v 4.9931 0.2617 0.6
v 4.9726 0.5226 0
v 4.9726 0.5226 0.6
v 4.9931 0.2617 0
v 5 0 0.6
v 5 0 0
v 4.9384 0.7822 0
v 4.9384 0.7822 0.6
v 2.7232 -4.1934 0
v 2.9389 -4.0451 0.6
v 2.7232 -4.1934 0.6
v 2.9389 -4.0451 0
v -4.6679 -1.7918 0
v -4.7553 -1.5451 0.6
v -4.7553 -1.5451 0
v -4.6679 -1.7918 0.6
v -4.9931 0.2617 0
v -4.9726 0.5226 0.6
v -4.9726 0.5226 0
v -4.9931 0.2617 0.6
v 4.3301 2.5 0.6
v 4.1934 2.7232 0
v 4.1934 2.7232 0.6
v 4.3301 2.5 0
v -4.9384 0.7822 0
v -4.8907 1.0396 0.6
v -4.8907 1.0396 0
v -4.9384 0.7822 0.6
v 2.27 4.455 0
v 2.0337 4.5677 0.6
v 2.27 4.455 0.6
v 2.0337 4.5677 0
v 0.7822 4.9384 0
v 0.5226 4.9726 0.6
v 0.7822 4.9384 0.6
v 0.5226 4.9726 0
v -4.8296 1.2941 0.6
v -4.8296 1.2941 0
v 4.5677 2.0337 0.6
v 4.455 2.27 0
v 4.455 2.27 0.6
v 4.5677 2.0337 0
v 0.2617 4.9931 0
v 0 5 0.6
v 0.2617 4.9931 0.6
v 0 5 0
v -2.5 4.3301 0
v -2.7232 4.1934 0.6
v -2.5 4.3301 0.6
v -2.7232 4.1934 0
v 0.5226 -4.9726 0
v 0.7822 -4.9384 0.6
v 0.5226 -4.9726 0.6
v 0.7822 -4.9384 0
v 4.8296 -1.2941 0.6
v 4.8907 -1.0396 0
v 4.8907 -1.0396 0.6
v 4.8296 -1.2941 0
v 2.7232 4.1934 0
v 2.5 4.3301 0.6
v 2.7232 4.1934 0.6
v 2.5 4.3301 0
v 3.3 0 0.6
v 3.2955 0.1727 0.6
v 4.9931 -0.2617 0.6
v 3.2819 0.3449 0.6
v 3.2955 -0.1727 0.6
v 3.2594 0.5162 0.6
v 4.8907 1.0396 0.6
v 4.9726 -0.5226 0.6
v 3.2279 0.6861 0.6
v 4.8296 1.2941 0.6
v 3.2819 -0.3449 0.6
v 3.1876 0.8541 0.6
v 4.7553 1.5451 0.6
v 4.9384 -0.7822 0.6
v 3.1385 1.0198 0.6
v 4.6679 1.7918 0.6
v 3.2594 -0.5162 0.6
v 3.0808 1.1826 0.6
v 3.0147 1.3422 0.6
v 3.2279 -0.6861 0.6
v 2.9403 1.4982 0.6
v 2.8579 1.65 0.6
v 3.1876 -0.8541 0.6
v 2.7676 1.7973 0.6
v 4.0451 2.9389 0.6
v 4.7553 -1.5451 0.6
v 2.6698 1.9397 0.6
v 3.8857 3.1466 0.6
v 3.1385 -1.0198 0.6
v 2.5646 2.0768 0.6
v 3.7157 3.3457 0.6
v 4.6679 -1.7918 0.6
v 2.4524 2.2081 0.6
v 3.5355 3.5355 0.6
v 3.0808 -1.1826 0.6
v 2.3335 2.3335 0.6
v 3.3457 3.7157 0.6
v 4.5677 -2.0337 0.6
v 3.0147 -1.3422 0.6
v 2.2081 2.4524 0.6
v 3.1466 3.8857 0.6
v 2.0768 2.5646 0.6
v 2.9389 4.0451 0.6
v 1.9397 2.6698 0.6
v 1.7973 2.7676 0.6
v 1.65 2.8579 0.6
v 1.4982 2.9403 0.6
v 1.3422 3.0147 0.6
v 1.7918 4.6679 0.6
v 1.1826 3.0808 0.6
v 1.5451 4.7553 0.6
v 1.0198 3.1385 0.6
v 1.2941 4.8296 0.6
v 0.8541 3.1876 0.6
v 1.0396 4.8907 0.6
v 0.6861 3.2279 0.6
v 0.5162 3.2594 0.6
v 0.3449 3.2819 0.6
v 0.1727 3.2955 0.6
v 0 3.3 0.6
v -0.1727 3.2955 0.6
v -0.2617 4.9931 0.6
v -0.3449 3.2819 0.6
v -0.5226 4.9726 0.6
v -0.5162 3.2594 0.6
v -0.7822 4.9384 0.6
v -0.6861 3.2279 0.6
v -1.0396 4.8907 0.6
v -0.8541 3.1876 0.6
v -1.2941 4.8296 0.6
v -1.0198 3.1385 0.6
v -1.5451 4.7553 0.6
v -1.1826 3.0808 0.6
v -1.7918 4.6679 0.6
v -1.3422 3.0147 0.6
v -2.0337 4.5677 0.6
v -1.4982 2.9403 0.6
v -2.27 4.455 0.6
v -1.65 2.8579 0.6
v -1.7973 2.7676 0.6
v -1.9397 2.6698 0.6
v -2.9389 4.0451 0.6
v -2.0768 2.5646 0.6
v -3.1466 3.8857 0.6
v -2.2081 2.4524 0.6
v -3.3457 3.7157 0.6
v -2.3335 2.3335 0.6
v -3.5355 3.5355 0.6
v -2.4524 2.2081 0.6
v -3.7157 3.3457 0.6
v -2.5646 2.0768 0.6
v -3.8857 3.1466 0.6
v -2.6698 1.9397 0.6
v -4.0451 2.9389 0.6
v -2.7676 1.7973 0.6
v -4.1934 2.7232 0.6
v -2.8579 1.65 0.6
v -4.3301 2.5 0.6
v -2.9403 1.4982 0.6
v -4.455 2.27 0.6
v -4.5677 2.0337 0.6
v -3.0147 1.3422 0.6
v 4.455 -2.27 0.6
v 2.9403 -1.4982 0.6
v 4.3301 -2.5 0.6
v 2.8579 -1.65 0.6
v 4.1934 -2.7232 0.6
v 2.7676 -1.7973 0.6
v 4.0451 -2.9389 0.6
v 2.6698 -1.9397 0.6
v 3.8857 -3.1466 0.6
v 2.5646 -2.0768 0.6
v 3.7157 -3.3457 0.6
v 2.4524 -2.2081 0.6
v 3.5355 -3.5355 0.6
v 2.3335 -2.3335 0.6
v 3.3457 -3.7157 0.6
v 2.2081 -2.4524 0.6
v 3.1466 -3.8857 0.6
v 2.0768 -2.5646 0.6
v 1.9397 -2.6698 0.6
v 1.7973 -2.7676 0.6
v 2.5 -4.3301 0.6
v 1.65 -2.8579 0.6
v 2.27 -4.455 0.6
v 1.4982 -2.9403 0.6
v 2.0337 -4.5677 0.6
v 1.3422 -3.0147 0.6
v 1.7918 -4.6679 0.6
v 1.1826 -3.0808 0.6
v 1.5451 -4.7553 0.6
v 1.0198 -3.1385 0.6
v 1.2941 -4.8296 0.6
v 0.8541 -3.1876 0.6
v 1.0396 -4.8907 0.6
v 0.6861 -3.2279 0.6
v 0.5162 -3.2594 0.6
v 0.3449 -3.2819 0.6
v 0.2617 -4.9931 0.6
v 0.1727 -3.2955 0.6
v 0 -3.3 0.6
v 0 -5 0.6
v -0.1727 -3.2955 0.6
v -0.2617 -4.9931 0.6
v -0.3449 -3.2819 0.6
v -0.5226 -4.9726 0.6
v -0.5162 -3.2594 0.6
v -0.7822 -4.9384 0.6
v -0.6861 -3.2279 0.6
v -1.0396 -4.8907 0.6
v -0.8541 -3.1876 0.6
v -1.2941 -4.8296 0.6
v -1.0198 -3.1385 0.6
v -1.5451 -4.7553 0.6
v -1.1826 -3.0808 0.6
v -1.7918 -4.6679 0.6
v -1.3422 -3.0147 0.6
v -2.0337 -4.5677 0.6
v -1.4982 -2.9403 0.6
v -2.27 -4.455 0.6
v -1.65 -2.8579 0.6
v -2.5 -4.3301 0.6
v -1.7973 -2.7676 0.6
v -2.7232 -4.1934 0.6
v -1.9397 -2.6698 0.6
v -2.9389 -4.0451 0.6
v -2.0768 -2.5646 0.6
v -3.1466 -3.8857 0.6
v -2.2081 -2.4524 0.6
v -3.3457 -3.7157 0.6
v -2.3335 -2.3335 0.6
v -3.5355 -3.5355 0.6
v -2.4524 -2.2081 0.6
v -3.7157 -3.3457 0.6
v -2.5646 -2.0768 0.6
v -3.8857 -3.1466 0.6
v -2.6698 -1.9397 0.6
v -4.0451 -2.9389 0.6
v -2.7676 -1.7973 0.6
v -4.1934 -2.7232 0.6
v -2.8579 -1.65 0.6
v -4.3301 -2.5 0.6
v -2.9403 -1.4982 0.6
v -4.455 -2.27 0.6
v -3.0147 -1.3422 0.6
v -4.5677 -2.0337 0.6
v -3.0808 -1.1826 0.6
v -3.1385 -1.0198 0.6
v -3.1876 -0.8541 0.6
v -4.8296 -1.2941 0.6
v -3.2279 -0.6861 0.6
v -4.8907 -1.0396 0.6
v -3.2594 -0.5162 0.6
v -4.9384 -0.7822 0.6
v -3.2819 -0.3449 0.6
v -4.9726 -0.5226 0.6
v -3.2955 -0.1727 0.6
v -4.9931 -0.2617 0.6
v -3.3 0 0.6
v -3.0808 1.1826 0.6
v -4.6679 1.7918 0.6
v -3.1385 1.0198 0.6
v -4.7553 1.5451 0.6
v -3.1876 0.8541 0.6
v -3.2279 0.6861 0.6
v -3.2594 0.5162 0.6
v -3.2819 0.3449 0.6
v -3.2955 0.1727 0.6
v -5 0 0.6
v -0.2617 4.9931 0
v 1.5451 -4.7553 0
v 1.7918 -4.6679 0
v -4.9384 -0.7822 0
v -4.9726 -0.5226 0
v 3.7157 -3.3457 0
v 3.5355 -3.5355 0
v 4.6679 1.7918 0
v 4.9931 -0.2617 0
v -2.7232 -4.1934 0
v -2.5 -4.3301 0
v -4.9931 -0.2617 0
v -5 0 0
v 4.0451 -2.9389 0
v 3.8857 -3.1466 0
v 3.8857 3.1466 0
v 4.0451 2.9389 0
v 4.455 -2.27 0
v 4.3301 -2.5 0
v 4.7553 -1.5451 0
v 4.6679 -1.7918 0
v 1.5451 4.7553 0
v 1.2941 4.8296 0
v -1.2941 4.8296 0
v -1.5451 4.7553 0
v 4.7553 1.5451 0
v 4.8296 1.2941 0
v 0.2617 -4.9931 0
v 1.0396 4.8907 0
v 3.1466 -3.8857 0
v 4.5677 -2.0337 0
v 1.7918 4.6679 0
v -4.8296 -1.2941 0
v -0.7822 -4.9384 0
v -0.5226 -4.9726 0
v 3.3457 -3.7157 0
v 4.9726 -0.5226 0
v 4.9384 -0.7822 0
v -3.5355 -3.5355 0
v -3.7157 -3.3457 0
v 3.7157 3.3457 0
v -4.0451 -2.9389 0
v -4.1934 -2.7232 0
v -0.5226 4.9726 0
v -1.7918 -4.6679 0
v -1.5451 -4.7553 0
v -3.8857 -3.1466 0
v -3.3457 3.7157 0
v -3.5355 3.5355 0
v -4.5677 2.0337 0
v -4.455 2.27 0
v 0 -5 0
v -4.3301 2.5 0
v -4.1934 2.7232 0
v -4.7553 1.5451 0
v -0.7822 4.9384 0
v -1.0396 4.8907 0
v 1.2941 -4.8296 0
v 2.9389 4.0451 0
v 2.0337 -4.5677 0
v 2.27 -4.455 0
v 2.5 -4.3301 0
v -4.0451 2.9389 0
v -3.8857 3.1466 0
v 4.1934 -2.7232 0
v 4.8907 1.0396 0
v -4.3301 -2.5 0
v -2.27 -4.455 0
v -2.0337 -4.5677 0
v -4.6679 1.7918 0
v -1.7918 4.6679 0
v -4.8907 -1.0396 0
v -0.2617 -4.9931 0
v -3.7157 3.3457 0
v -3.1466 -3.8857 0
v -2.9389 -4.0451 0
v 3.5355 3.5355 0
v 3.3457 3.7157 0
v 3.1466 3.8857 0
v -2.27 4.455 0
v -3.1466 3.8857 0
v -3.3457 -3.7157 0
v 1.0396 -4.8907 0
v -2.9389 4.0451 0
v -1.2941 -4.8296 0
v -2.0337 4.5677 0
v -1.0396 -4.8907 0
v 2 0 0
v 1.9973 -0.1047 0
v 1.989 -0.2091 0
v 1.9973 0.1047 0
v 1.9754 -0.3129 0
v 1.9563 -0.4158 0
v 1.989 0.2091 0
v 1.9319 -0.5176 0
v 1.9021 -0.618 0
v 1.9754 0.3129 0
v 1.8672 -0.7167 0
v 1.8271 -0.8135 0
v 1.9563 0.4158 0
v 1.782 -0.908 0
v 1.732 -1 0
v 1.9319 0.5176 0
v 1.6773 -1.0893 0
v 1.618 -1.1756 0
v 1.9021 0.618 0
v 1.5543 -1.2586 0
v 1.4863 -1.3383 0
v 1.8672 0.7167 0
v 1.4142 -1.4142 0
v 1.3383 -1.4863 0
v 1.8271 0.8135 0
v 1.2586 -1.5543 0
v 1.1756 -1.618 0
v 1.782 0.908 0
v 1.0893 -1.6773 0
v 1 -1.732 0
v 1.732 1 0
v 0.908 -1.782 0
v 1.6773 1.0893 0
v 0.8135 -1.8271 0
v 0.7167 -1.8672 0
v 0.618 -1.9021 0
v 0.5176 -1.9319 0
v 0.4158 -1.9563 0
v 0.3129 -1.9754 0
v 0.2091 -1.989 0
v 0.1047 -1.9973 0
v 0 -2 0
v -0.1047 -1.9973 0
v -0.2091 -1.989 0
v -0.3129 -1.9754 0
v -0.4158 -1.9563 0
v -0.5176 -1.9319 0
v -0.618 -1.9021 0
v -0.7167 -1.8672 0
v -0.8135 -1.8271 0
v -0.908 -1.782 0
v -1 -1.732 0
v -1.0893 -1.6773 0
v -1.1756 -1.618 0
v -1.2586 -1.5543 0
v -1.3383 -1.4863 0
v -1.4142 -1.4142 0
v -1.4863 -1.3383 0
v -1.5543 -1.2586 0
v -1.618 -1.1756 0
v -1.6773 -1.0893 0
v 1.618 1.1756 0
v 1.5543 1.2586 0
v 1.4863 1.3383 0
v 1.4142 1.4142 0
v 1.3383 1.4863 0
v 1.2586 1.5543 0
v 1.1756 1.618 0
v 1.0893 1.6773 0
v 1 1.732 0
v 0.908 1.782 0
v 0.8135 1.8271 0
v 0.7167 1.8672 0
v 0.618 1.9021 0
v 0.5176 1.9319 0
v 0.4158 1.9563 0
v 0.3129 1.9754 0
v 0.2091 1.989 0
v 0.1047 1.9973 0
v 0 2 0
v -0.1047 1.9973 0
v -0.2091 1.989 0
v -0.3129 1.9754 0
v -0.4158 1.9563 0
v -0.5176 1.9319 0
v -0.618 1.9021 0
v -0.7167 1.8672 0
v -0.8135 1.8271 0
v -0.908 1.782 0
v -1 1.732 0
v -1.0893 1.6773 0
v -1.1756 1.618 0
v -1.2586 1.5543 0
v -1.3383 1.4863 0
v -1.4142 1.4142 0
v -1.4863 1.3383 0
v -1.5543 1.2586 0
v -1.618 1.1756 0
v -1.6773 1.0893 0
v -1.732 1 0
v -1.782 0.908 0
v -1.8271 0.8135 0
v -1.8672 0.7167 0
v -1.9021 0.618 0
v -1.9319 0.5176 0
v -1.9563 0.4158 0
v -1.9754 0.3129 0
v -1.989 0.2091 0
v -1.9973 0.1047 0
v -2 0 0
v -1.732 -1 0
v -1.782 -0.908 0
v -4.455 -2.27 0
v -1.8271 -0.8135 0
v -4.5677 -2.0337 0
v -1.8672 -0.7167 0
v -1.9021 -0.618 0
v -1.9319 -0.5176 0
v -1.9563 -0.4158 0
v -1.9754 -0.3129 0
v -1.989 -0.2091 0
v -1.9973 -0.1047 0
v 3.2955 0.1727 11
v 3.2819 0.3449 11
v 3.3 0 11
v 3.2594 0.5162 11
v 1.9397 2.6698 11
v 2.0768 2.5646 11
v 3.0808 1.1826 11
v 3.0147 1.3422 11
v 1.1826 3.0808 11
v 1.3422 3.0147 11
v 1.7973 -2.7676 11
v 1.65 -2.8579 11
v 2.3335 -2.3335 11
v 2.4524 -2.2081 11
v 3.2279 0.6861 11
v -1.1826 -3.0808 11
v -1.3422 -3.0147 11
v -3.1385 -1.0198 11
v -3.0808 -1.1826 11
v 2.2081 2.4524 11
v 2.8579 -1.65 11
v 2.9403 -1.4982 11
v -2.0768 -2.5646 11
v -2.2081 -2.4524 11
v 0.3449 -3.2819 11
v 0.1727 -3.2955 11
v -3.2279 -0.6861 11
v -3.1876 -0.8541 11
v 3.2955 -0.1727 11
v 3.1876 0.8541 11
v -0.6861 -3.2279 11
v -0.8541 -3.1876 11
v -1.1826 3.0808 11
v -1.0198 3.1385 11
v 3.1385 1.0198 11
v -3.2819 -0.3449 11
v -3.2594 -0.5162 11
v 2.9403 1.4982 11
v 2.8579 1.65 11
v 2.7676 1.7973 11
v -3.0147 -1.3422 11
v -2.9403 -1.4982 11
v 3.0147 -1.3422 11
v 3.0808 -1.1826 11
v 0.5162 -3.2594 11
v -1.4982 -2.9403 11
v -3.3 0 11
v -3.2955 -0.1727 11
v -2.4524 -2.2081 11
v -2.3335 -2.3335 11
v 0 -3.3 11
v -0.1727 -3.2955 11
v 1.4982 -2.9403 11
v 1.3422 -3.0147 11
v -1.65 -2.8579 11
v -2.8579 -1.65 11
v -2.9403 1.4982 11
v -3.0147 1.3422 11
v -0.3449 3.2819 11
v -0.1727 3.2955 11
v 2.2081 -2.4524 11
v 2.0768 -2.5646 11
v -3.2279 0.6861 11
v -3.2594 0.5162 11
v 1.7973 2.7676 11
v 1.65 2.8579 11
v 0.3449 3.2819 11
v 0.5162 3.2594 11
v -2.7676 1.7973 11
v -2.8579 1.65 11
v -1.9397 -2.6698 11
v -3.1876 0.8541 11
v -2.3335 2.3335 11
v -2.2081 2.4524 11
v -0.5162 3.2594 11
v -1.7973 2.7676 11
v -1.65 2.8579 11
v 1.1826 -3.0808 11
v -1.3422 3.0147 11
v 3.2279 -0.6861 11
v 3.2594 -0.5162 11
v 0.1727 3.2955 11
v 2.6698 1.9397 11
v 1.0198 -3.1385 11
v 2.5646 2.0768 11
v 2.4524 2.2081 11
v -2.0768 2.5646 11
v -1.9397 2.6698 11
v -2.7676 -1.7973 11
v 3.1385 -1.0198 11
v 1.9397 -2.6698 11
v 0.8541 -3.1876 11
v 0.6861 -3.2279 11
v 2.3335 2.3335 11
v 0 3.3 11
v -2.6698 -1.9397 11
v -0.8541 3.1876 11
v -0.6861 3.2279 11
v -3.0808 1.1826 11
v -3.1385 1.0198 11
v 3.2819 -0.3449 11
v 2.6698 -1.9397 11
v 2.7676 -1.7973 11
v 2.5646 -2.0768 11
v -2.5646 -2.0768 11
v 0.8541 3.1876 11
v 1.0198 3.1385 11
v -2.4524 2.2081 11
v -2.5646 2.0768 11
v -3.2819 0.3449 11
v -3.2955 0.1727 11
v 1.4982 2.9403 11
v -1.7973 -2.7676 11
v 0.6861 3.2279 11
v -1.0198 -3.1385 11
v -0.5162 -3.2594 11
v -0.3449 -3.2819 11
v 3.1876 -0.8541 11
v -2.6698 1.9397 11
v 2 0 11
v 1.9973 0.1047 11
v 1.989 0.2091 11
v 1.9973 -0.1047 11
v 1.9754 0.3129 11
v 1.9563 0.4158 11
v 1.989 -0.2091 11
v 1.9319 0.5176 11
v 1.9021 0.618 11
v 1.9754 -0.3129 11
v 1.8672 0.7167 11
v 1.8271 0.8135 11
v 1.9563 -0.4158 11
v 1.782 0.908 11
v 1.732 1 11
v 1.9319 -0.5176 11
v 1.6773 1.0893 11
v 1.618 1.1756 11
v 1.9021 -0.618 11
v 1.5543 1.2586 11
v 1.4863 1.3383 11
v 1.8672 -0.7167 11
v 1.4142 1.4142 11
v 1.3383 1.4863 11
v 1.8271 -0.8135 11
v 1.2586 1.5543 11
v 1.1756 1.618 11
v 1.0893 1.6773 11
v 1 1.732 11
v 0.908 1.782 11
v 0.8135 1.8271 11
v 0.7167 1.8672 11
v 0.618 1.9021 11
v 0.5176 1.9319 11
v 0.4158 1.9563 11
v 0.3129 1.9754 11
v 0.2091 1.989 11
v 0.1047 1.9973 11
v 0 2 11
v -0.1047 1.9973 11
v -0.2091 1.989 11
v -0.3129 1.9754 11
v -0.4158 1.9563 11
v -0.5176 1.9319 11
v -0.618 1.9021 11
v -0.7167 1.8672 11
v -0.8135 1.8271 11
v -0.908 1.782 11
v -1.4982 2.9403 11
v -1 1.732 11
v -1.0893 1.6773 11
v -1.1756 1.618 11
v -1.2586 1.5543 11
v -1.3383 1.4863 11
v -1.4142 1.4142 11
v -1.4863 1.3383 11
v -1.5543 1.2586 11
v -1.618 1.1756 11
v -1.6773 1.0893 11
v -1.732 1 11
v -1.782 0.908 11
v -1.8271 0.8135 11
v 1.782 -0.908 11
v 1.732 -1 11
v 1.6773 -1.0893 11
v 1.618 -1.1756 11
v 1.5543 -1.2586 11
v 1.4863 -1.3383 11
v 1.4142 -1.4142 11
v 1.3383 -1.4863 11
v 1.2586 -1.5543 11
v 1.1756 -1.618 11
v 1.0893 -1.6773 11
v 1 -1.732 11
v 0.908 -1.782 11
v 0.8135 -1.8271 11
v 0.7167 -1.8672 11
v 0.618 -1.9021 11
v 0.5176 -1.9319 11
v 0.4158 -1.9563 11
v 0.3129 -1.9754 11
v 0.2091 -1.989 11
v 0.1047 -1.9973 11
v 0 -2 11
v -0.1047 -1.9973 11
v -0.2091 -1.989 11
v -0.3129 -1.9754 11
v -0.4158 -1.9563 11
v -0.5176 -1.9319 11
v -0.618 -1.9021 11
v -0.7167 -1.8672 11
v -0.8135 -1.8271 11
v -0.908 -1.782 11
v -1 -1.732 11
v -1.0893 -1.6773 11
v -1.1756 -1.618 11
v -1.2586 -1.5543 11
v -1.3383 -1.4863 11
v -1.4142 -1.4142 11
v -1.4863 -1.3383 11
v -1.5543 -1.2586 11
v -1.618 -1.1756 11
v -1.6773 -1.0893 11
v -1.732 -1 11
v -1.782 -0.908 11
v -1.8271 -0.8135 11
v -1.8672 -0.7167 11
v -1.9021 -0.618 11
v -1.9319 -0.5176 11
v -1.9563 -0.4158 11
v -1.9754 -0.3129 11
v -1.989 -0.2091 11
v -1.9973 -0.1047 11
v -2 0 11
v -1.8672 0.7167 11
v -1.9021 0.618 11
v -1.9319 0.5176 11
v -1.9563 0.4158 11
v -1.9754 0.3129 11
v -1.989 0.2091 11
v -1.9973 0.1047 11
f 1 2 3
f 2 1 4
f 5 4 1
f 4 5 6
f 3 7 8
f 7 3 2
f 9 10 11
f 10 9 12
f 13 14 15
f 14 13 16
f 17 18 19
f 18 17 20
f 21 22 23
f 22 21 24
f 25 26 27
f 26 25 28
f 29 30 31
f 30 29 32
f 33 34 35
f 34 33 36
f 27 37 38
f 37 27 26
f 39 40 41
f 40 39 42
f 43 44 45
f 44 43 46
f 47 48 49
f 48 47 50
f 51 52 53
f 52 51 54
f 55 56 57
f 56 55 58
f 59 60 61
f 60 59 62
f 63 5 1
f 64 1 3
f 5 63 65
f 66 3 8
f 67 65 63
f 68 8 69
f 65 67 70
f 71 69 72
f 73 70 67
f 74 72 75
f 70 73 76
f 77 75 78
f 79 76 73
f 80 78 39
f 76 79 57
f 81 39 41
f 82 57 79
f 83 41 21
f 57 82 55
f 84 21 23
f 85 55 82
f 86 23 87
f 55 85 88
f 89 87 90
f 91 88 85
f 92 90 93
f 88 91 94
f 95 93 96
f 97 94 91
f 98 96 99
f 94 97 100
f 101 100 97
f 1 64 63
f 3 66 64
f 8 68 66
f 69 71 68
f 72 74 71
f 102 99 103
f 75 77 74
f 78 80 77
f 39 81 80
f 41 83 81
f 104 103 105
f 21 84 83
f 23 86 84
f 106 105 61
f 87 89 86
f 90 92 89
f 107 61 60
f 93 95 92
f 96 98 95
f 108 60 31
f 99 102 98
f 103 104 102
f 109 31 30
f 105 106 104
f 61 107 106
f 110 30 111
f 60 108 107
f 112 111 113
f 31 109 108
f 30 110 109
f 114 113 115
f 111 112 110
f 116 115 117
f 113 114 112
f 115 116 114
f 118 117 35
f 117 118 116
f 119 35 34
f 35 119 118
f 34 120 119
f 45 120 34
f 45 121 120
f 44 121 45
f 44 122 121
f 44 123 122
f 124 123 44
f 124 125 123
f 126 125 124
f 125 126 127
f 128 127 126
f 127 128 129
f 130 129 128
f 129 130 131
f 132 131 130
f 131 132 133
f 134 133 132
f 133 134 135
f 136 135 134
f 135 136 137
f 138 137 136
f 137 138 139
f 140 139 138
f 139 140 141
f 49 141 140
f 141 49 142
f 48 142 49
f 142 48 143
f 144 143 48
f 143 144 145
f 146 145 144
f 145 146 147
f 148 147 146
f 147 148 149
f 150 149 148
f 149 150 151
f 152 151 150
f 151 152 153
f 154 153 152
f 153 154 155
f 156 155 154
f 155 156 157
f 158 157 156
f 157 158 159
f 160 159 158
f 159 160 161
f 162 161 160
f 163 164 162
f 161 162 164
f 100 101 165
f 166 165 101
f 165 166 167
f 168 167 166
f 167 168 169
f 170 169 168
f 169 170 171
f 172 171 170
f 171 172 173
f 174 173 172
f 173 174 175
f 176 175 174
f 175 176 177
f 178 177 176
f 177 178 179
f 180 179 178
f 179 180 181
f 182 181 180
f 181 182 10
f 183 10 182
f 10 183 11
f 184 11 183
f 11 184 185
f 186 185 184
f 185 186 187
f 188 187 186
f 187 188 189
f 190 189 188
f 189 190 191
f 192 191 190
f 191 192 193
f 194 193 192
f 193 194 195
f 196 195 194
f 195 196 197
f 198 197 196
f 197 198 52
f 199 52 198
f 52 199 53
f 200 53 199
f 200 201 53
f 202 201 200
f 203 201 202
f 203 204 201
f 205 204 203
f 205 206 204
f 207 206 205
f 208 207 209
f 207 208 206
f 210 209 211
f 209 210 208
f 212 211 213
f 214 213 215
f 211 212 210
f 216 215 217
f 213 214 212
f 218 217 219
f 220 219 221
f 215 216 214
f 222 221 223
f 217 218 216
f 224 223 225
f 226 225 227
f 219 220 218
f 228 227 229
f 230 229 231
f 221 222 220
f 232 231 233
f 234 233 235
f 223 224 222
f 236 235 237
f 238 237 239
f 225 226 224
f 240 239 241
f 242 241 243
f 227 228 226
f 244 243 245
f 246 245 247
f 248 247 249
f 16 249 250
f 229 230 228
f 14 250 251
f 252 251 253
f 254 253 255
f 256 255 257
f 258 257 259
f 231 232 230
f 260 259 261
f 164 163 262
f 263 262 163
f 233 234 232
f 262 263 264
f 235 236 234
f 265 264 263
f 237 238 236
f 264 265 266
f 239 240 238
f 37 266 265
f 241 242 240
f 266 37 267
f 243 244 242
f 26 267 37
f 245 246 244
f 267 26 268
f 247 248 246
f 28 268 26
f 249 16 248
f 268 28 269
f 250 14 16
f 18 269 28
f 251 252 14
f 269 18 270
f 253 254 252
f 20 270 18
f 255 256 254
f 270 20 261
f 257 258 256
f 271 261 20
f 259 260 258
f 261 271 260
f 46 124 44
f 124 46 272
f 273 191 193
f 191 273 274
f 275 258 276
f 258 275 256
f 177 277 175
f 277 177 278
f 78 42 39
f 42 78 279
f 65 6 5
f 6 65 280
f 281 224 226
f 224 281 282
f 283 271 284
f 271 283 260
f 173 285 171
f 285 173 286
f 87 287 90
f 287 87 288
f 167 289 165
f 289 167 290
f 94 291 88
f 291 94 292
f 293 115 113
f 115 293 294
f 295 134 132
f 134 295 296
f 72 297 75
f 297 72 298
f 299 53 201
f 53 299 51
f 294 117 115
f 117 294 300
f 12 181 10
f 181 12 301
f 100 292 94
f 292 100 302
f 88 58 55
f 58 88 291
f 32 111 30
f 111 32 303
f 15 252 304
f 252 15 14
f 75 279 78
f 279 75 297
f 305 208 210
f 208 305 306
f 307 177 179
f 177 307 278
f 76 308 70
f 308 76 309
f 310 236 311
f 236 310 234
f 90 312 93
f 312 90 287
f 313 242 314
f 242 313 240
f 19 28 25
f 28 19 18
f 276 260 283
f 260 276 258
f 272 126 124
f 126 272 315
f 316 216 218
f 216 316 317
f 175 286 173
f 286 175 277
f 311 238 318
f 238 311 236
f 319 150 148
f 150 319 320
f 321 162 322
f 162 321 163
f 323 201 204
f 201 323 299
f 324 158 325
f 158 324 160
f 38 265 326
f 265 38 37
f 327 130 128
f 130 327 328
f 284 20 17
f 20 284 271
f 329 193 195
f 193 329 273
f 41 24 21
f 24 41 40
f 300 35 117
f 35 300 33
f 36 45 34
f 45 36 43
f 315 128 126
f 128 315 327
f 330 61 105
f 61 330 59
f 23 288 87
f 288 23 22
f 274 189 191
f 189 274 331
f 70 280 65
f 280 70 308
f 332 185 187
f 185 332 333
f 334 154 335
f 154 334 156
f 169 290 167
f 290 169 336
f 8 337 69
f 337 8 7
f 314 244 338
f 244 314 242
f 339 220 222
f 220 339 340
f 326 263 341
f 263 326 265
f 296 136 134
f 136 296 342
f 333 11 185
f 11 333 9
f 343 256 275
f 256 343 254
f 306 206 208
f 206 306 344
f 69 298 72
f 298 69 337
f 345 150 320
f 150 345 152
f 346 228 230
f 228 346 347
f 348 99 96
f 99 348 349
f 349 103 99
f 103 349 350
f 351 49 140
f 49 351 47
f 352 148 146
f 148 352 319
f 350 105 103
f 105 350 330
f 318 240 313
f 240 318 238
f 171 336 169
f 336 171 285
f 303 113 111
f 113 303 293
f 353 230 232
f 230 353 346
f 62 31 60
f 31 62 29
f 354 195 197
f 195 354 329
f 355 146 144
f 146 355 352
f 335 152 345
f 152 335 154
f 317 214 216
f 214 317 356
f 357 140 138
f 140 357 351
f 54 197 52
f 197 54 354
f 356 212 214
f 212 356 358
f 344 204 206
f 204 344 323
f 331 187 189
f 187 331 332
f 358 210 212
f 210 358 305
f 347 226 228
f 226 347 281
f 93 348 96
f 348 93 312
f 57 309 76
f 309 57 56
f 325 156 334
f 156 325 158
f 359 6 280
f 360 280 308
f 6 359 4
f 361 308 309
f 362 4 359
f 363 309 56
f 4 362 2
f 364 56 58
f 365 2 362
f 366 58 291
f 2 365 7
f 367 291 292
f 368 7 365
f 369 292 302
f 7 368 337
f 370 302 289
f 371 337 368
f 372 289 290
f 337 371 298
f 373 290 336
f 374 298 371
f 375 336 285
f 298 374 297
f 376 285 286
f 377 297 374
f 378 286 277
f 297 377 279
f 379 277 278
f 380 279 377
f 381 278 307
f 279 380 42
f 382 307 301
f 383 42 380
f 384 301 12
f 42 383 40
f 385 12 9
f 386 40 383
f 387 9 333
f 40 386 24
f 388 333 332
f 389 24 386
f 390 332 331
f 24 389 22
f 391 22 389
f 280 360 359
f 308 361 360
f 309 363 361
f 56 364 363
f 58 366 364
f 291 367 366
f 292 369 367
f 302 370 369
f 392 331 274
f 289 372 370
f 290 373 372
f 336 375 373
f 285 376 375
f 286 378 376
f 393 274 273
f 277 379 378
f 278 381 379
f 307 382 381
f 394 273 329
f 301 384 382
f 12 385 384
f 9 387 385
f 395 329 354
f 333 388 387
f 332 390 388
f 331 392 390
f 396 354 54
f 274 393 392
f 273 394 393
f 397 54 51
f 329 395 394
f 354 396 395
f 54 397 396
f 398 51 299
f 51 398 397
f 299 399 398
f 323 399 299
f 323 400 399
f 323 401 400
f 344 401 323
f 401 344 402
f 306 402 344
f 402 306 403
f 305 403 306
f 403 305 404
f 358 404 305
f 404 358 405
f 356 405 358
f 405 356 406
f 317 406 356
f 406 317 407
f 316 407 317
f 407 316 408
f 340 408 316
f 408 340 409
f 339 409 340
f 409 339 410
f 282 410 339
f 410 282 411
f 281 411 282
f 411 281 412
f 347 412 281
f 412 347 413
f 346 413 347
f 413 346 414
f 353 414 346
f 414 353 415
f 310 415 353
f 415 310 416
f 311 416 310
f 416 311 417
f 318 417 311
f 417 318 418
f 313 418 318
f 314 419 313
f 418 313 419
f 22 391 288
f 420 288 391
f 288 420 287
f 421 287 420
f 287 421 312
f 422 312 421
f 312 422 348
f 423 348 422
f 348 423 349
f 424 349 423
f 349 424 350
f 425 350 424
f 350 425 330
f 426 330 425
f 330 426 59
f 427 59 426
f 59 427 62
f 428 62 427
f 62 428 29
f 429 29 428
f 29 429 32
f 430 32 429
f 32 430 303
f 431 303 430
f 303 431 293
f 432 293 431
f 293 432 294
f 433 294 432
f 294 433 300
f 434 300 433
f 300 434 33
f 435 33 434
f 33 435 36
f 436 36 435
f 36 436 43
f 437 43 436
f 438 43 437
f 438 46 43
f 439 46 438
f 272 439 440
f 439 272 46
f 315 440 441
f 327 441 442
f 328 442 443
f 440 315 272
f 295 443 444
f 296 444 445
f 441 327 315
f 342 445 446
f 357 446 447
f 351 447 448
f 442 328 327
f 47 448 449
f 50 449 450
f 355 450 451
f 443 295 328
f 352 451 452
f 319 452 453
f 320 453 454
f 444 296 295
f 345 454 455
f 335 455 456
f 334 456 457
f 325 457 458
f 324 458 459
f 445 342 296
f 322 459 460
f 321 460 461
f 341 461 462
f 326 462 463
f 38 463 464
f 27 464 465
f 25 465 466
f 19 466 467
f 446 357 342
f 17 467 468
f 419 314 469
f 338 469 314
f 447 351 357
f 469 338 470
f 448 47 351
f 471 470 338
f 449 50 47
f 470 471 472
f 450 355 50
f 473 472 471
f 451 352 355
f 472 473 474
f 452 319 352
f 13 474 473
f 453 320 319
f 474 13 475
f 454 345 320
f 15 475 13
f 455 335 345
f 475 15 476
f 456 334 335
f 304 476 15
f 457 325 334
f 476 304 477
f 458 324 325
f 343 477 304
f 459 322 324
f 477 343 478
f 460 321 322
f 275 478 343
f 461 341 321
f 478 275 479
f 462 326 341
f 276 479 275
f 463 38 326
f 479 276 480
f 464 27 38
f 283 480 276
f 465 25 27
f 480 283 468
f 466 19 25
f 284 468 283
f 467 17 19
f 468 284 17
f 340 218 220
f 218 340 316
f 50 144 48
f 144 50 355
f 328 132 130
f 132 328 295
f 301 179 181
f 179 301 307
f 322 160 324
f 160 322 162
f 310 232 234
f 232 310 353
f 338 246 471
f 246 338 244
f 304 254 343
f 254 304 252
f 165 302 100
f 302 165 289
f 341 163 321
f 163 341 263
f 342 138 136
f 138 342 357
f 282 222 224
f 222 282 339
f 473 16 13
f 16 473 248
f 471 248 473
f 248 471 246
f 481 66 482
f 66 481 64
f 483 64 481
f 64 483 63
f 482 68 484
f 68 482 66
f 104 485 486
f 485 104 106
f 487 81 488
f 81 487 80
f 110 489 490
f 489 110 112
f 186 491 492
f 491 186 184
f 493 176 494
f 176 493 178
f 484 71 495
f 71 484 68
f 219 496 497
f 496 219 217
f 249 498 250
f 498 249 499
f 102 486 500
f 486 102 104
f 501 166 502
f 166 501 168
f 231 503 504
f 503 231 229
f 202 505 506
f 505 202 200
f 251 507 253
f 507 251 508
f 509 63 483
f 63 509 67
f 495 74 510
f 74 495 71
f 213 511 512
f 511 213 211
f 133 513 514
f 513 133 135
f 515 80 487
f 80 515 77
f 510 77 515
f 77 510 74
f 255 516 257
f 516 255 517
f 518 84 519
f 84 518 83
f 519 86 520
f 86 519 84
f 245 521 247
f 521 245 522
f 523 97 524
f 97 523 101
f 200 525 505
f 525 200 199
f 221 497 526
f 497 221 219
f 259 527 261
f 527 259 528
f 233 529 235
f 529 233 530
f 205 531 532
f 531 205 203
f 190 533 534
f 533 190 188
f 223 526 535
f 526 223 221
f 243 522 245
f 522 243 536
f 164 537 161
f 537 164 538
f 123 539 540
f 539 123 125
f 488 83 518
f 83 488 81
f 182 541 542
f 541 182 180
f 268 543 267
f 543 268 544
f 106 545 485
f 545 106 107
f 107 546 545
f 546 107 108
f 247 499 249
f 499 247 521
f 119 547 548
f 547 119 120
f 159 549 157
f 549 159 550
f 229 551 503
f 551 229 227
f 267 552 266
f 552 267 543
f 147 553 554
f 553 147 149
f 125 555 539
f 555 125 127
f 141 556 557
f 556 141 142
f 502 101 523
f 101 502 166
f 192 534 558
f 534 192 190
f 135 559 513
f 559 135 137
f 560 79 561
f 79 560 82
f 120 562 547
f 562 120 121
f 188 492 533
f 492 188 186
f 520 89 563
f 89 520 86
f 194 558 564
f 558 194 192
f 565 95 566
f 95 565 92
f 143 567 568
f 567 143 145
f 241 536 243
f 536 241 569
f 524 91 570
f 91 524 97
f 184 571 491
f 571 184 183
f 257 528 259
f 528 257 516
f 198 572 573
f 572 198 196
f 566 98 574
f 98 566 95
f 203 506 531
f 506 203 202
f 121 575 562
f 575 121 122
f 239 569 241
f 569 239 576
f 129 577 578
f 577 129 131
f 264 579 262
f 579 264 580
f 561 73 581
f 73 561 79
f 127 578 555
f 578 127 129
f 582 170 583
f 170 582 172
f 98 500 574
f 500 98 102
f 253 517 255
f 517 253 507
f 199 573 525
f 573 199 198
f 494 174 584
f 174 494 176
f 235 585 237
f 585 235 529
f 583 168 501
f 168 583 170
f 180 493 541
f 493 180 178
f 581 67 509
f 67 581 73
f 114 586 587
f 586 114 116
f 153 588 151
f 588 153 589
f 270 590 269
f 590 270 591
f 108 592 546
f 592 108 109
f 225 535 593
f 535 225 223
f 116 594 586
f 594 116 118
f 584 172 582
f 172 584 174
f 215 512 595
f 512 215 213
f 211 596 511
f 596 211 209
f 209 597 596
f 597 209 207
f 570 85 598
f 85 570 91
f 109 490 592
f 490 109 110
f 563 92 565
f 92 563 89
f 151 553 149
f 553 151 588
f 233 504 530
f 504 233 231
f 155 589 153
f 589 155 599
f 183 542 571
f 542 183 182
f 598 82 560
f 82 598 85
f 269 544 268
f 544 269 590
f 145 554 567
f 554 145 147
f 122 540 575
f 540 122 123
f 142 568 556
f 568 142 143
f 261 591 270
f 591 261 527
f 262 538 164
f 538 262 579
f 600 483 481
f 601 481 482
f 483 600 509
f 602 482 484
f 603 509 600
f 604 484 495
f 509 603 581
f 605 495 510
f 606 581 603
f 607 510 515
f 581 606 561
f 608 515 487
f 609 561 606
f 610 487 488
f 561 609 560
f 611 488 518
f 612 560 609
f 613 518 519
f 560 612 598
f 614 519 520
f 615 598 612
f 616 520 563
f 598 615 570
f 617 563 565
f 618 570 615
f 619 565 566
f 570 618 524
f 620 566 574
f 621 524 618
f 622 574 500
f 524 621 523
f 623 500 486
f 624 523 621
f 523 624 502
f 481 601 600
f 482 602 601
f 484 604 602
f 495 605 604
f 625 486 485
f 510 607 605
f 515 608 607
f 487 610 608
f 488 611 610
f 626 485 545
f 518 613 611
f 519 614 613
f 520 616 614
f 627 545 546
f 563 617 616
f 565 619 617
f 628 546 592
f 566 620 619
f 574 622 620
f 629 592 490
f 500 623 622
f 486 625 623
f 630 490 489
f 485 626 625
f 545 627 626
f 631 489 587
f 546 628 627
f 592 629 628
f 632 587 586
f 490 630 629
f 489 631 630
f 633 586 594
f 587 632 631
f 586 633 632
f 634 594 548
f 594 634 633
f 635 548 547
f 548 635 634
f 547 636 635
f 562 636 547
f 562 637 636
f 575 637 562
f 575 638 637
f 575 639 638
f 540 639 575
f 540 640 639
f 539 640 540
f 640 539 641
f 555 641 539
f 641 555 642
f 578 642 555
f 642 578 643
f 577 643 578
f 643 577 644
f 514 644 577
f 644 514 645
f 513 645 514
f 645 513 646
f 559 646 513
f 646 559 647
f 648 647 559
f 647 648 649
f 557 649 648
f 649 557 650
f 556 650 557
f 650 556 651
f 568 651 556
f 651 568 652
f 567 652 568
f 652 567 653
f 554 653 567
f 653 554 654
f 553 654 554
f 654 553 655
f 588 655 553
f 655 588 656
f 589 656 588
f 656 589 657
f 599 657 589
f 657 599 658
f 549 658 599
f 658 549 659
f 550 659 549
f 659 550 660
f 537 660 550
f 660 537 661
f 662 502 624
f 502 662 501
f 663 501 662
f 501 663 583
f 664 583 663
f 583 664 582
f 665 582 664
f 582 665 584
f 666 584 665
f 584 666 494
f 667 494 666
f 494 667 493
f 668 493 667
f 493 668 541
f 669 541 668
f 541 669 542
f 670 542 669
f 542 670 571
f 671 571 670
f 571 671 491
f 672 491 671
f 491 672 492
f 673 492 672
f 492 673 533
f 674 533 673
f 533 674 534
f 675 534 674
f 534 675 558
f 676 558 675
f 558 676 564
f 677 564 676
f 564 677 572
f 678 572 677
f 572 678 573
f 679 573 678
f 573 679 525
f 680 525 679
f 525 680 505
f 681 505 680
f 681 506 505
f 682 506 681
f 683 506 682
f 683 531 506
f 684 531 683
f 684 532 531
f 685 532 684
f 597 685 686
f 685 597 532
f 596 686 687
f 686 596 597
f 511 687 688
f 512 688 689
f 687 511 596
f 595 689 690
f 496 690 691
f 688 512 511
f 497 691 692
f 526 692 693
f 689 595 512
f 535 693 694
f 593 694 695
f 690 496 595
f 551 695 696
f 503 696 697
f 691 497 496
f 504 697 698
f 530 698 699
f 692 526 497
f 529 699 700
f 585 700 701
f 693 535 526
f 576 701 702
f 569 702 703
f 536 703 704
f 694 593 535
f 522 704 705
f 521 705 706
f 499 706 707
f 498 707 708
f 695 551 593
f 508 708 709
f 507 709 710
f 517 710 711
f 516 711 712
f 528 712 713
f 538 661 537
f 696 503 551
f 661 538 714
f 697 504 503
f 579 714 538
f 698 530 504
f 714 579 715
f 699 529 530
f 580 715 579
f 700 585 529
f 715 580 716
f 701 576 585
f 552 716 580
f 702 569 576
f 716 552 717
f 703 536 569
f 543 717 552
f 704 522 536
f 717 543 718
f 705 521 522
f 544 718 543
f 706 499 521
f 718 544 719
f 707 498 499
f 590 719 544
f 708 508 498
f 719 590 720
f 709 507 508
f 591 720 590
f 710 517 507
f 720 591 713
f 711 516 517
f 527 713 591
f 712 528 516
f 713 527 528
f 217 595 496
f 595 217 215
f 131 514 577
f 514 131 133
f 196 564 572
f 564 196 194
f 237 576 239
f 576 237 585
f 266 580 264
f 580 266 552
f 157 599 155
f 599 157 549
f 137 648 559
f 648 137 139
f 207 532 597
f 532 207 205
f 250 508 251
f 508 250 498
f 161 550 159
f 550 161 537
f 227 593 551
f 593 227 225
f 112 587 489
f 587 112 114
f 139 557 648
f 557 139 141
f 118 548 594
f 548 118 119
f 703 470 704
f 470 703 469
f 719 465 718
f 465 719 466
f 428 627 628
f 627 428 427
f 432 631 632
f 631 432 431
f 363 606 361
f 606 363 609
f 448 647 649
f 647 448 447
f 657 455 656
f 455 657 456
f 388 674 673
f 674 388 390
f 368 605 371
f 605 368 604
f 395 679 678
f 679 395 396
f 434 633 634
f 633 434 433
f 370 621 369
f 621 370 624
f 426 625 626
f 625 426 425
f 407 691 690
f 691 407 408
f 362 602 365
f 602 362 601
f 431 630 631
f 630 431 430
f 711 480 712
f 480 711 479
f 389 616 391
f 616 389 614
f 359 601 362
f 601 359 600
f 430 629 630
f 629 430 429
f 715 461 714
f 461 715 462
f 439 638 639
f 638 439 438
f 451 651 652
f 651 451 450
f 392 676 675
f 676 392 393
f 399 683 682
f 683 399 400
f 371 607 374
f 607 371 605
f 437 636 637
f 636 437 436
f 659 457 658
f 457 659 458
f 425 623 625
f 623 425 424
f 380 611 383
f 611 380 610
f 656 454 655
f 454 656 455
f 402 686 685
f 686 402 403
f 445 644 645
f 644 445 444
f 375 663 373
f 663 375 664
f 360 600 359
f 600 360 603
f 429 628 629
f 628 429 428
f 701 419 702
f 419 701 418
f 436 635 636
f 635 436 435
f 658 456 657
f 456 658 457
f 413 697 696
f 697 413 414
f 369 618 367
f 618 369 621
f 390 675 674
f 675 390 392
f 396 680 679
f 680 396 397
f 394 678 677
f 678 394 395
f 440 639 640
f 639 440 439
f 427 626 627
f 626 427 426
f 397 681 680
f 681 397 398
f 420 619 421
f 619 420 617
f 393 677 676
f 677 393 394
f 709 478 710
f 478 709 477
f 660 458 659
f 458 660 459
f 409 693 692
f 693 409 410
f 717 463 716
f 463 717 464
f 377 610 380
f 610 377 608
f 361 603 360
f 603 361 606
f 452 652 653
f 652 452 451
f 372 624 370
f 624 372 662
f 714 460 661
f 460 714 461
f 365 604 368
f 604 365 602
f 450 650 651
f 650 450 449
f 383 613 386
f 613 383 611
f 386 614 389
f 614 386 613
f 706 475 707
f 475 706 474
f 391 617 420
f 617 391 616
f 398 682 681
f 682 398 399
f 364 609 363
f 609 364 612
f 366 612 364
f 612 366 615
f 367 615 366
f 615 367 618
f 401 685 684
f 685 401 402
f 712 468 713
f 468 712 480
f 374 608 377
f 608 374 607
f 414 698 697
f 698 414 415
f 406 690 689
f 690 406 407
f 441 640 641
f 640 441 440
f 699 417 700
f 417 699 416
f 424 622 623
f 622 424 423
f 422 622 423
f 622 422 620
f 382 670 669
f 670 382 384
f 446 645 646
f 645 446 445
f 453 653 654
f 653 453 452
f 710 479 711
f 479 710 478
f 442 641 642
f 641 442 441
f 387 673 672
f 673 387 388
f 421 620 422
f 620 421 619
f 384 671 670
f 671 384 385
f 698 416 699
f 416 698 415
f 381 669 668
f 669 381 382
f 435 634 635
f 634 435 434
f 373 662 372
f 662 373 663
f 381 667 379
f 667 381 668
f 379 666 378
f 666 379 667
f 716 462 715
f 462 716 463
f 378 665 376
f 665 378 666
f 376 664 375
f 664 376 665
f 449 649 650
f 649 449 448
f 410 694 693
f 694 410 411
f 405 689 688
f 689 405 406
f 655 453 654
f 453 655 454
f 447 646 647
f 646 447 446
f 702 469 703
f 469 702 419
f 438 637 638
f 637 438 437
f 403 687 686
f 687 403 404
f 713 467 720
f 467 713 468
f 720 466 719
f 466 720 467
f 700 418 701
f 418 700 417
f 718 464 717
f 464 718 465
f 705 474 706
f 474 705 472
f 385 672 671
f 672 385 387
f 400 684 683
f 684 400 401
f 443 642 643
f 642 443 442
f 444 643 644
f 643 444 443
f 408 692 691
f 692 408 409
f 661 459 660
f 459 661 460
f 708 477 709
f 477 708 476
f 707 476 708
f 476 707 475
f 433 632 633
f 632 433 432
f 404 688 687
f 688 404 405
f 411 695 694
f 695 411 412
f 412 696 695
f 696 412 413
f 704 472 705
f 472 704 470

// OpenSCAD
// Real Lonely T-Rex Game: Wall Spacer
// Copyright (C) 2017, Uri Shaked and Ariella Eliassaf

$fn = 120;

difference() {
    union() {
        cylinder(h=0.6, r=5);
        cylinder(h=11, r=3.3);
    }
    
    cylinder(h=11, r=2);
}    
